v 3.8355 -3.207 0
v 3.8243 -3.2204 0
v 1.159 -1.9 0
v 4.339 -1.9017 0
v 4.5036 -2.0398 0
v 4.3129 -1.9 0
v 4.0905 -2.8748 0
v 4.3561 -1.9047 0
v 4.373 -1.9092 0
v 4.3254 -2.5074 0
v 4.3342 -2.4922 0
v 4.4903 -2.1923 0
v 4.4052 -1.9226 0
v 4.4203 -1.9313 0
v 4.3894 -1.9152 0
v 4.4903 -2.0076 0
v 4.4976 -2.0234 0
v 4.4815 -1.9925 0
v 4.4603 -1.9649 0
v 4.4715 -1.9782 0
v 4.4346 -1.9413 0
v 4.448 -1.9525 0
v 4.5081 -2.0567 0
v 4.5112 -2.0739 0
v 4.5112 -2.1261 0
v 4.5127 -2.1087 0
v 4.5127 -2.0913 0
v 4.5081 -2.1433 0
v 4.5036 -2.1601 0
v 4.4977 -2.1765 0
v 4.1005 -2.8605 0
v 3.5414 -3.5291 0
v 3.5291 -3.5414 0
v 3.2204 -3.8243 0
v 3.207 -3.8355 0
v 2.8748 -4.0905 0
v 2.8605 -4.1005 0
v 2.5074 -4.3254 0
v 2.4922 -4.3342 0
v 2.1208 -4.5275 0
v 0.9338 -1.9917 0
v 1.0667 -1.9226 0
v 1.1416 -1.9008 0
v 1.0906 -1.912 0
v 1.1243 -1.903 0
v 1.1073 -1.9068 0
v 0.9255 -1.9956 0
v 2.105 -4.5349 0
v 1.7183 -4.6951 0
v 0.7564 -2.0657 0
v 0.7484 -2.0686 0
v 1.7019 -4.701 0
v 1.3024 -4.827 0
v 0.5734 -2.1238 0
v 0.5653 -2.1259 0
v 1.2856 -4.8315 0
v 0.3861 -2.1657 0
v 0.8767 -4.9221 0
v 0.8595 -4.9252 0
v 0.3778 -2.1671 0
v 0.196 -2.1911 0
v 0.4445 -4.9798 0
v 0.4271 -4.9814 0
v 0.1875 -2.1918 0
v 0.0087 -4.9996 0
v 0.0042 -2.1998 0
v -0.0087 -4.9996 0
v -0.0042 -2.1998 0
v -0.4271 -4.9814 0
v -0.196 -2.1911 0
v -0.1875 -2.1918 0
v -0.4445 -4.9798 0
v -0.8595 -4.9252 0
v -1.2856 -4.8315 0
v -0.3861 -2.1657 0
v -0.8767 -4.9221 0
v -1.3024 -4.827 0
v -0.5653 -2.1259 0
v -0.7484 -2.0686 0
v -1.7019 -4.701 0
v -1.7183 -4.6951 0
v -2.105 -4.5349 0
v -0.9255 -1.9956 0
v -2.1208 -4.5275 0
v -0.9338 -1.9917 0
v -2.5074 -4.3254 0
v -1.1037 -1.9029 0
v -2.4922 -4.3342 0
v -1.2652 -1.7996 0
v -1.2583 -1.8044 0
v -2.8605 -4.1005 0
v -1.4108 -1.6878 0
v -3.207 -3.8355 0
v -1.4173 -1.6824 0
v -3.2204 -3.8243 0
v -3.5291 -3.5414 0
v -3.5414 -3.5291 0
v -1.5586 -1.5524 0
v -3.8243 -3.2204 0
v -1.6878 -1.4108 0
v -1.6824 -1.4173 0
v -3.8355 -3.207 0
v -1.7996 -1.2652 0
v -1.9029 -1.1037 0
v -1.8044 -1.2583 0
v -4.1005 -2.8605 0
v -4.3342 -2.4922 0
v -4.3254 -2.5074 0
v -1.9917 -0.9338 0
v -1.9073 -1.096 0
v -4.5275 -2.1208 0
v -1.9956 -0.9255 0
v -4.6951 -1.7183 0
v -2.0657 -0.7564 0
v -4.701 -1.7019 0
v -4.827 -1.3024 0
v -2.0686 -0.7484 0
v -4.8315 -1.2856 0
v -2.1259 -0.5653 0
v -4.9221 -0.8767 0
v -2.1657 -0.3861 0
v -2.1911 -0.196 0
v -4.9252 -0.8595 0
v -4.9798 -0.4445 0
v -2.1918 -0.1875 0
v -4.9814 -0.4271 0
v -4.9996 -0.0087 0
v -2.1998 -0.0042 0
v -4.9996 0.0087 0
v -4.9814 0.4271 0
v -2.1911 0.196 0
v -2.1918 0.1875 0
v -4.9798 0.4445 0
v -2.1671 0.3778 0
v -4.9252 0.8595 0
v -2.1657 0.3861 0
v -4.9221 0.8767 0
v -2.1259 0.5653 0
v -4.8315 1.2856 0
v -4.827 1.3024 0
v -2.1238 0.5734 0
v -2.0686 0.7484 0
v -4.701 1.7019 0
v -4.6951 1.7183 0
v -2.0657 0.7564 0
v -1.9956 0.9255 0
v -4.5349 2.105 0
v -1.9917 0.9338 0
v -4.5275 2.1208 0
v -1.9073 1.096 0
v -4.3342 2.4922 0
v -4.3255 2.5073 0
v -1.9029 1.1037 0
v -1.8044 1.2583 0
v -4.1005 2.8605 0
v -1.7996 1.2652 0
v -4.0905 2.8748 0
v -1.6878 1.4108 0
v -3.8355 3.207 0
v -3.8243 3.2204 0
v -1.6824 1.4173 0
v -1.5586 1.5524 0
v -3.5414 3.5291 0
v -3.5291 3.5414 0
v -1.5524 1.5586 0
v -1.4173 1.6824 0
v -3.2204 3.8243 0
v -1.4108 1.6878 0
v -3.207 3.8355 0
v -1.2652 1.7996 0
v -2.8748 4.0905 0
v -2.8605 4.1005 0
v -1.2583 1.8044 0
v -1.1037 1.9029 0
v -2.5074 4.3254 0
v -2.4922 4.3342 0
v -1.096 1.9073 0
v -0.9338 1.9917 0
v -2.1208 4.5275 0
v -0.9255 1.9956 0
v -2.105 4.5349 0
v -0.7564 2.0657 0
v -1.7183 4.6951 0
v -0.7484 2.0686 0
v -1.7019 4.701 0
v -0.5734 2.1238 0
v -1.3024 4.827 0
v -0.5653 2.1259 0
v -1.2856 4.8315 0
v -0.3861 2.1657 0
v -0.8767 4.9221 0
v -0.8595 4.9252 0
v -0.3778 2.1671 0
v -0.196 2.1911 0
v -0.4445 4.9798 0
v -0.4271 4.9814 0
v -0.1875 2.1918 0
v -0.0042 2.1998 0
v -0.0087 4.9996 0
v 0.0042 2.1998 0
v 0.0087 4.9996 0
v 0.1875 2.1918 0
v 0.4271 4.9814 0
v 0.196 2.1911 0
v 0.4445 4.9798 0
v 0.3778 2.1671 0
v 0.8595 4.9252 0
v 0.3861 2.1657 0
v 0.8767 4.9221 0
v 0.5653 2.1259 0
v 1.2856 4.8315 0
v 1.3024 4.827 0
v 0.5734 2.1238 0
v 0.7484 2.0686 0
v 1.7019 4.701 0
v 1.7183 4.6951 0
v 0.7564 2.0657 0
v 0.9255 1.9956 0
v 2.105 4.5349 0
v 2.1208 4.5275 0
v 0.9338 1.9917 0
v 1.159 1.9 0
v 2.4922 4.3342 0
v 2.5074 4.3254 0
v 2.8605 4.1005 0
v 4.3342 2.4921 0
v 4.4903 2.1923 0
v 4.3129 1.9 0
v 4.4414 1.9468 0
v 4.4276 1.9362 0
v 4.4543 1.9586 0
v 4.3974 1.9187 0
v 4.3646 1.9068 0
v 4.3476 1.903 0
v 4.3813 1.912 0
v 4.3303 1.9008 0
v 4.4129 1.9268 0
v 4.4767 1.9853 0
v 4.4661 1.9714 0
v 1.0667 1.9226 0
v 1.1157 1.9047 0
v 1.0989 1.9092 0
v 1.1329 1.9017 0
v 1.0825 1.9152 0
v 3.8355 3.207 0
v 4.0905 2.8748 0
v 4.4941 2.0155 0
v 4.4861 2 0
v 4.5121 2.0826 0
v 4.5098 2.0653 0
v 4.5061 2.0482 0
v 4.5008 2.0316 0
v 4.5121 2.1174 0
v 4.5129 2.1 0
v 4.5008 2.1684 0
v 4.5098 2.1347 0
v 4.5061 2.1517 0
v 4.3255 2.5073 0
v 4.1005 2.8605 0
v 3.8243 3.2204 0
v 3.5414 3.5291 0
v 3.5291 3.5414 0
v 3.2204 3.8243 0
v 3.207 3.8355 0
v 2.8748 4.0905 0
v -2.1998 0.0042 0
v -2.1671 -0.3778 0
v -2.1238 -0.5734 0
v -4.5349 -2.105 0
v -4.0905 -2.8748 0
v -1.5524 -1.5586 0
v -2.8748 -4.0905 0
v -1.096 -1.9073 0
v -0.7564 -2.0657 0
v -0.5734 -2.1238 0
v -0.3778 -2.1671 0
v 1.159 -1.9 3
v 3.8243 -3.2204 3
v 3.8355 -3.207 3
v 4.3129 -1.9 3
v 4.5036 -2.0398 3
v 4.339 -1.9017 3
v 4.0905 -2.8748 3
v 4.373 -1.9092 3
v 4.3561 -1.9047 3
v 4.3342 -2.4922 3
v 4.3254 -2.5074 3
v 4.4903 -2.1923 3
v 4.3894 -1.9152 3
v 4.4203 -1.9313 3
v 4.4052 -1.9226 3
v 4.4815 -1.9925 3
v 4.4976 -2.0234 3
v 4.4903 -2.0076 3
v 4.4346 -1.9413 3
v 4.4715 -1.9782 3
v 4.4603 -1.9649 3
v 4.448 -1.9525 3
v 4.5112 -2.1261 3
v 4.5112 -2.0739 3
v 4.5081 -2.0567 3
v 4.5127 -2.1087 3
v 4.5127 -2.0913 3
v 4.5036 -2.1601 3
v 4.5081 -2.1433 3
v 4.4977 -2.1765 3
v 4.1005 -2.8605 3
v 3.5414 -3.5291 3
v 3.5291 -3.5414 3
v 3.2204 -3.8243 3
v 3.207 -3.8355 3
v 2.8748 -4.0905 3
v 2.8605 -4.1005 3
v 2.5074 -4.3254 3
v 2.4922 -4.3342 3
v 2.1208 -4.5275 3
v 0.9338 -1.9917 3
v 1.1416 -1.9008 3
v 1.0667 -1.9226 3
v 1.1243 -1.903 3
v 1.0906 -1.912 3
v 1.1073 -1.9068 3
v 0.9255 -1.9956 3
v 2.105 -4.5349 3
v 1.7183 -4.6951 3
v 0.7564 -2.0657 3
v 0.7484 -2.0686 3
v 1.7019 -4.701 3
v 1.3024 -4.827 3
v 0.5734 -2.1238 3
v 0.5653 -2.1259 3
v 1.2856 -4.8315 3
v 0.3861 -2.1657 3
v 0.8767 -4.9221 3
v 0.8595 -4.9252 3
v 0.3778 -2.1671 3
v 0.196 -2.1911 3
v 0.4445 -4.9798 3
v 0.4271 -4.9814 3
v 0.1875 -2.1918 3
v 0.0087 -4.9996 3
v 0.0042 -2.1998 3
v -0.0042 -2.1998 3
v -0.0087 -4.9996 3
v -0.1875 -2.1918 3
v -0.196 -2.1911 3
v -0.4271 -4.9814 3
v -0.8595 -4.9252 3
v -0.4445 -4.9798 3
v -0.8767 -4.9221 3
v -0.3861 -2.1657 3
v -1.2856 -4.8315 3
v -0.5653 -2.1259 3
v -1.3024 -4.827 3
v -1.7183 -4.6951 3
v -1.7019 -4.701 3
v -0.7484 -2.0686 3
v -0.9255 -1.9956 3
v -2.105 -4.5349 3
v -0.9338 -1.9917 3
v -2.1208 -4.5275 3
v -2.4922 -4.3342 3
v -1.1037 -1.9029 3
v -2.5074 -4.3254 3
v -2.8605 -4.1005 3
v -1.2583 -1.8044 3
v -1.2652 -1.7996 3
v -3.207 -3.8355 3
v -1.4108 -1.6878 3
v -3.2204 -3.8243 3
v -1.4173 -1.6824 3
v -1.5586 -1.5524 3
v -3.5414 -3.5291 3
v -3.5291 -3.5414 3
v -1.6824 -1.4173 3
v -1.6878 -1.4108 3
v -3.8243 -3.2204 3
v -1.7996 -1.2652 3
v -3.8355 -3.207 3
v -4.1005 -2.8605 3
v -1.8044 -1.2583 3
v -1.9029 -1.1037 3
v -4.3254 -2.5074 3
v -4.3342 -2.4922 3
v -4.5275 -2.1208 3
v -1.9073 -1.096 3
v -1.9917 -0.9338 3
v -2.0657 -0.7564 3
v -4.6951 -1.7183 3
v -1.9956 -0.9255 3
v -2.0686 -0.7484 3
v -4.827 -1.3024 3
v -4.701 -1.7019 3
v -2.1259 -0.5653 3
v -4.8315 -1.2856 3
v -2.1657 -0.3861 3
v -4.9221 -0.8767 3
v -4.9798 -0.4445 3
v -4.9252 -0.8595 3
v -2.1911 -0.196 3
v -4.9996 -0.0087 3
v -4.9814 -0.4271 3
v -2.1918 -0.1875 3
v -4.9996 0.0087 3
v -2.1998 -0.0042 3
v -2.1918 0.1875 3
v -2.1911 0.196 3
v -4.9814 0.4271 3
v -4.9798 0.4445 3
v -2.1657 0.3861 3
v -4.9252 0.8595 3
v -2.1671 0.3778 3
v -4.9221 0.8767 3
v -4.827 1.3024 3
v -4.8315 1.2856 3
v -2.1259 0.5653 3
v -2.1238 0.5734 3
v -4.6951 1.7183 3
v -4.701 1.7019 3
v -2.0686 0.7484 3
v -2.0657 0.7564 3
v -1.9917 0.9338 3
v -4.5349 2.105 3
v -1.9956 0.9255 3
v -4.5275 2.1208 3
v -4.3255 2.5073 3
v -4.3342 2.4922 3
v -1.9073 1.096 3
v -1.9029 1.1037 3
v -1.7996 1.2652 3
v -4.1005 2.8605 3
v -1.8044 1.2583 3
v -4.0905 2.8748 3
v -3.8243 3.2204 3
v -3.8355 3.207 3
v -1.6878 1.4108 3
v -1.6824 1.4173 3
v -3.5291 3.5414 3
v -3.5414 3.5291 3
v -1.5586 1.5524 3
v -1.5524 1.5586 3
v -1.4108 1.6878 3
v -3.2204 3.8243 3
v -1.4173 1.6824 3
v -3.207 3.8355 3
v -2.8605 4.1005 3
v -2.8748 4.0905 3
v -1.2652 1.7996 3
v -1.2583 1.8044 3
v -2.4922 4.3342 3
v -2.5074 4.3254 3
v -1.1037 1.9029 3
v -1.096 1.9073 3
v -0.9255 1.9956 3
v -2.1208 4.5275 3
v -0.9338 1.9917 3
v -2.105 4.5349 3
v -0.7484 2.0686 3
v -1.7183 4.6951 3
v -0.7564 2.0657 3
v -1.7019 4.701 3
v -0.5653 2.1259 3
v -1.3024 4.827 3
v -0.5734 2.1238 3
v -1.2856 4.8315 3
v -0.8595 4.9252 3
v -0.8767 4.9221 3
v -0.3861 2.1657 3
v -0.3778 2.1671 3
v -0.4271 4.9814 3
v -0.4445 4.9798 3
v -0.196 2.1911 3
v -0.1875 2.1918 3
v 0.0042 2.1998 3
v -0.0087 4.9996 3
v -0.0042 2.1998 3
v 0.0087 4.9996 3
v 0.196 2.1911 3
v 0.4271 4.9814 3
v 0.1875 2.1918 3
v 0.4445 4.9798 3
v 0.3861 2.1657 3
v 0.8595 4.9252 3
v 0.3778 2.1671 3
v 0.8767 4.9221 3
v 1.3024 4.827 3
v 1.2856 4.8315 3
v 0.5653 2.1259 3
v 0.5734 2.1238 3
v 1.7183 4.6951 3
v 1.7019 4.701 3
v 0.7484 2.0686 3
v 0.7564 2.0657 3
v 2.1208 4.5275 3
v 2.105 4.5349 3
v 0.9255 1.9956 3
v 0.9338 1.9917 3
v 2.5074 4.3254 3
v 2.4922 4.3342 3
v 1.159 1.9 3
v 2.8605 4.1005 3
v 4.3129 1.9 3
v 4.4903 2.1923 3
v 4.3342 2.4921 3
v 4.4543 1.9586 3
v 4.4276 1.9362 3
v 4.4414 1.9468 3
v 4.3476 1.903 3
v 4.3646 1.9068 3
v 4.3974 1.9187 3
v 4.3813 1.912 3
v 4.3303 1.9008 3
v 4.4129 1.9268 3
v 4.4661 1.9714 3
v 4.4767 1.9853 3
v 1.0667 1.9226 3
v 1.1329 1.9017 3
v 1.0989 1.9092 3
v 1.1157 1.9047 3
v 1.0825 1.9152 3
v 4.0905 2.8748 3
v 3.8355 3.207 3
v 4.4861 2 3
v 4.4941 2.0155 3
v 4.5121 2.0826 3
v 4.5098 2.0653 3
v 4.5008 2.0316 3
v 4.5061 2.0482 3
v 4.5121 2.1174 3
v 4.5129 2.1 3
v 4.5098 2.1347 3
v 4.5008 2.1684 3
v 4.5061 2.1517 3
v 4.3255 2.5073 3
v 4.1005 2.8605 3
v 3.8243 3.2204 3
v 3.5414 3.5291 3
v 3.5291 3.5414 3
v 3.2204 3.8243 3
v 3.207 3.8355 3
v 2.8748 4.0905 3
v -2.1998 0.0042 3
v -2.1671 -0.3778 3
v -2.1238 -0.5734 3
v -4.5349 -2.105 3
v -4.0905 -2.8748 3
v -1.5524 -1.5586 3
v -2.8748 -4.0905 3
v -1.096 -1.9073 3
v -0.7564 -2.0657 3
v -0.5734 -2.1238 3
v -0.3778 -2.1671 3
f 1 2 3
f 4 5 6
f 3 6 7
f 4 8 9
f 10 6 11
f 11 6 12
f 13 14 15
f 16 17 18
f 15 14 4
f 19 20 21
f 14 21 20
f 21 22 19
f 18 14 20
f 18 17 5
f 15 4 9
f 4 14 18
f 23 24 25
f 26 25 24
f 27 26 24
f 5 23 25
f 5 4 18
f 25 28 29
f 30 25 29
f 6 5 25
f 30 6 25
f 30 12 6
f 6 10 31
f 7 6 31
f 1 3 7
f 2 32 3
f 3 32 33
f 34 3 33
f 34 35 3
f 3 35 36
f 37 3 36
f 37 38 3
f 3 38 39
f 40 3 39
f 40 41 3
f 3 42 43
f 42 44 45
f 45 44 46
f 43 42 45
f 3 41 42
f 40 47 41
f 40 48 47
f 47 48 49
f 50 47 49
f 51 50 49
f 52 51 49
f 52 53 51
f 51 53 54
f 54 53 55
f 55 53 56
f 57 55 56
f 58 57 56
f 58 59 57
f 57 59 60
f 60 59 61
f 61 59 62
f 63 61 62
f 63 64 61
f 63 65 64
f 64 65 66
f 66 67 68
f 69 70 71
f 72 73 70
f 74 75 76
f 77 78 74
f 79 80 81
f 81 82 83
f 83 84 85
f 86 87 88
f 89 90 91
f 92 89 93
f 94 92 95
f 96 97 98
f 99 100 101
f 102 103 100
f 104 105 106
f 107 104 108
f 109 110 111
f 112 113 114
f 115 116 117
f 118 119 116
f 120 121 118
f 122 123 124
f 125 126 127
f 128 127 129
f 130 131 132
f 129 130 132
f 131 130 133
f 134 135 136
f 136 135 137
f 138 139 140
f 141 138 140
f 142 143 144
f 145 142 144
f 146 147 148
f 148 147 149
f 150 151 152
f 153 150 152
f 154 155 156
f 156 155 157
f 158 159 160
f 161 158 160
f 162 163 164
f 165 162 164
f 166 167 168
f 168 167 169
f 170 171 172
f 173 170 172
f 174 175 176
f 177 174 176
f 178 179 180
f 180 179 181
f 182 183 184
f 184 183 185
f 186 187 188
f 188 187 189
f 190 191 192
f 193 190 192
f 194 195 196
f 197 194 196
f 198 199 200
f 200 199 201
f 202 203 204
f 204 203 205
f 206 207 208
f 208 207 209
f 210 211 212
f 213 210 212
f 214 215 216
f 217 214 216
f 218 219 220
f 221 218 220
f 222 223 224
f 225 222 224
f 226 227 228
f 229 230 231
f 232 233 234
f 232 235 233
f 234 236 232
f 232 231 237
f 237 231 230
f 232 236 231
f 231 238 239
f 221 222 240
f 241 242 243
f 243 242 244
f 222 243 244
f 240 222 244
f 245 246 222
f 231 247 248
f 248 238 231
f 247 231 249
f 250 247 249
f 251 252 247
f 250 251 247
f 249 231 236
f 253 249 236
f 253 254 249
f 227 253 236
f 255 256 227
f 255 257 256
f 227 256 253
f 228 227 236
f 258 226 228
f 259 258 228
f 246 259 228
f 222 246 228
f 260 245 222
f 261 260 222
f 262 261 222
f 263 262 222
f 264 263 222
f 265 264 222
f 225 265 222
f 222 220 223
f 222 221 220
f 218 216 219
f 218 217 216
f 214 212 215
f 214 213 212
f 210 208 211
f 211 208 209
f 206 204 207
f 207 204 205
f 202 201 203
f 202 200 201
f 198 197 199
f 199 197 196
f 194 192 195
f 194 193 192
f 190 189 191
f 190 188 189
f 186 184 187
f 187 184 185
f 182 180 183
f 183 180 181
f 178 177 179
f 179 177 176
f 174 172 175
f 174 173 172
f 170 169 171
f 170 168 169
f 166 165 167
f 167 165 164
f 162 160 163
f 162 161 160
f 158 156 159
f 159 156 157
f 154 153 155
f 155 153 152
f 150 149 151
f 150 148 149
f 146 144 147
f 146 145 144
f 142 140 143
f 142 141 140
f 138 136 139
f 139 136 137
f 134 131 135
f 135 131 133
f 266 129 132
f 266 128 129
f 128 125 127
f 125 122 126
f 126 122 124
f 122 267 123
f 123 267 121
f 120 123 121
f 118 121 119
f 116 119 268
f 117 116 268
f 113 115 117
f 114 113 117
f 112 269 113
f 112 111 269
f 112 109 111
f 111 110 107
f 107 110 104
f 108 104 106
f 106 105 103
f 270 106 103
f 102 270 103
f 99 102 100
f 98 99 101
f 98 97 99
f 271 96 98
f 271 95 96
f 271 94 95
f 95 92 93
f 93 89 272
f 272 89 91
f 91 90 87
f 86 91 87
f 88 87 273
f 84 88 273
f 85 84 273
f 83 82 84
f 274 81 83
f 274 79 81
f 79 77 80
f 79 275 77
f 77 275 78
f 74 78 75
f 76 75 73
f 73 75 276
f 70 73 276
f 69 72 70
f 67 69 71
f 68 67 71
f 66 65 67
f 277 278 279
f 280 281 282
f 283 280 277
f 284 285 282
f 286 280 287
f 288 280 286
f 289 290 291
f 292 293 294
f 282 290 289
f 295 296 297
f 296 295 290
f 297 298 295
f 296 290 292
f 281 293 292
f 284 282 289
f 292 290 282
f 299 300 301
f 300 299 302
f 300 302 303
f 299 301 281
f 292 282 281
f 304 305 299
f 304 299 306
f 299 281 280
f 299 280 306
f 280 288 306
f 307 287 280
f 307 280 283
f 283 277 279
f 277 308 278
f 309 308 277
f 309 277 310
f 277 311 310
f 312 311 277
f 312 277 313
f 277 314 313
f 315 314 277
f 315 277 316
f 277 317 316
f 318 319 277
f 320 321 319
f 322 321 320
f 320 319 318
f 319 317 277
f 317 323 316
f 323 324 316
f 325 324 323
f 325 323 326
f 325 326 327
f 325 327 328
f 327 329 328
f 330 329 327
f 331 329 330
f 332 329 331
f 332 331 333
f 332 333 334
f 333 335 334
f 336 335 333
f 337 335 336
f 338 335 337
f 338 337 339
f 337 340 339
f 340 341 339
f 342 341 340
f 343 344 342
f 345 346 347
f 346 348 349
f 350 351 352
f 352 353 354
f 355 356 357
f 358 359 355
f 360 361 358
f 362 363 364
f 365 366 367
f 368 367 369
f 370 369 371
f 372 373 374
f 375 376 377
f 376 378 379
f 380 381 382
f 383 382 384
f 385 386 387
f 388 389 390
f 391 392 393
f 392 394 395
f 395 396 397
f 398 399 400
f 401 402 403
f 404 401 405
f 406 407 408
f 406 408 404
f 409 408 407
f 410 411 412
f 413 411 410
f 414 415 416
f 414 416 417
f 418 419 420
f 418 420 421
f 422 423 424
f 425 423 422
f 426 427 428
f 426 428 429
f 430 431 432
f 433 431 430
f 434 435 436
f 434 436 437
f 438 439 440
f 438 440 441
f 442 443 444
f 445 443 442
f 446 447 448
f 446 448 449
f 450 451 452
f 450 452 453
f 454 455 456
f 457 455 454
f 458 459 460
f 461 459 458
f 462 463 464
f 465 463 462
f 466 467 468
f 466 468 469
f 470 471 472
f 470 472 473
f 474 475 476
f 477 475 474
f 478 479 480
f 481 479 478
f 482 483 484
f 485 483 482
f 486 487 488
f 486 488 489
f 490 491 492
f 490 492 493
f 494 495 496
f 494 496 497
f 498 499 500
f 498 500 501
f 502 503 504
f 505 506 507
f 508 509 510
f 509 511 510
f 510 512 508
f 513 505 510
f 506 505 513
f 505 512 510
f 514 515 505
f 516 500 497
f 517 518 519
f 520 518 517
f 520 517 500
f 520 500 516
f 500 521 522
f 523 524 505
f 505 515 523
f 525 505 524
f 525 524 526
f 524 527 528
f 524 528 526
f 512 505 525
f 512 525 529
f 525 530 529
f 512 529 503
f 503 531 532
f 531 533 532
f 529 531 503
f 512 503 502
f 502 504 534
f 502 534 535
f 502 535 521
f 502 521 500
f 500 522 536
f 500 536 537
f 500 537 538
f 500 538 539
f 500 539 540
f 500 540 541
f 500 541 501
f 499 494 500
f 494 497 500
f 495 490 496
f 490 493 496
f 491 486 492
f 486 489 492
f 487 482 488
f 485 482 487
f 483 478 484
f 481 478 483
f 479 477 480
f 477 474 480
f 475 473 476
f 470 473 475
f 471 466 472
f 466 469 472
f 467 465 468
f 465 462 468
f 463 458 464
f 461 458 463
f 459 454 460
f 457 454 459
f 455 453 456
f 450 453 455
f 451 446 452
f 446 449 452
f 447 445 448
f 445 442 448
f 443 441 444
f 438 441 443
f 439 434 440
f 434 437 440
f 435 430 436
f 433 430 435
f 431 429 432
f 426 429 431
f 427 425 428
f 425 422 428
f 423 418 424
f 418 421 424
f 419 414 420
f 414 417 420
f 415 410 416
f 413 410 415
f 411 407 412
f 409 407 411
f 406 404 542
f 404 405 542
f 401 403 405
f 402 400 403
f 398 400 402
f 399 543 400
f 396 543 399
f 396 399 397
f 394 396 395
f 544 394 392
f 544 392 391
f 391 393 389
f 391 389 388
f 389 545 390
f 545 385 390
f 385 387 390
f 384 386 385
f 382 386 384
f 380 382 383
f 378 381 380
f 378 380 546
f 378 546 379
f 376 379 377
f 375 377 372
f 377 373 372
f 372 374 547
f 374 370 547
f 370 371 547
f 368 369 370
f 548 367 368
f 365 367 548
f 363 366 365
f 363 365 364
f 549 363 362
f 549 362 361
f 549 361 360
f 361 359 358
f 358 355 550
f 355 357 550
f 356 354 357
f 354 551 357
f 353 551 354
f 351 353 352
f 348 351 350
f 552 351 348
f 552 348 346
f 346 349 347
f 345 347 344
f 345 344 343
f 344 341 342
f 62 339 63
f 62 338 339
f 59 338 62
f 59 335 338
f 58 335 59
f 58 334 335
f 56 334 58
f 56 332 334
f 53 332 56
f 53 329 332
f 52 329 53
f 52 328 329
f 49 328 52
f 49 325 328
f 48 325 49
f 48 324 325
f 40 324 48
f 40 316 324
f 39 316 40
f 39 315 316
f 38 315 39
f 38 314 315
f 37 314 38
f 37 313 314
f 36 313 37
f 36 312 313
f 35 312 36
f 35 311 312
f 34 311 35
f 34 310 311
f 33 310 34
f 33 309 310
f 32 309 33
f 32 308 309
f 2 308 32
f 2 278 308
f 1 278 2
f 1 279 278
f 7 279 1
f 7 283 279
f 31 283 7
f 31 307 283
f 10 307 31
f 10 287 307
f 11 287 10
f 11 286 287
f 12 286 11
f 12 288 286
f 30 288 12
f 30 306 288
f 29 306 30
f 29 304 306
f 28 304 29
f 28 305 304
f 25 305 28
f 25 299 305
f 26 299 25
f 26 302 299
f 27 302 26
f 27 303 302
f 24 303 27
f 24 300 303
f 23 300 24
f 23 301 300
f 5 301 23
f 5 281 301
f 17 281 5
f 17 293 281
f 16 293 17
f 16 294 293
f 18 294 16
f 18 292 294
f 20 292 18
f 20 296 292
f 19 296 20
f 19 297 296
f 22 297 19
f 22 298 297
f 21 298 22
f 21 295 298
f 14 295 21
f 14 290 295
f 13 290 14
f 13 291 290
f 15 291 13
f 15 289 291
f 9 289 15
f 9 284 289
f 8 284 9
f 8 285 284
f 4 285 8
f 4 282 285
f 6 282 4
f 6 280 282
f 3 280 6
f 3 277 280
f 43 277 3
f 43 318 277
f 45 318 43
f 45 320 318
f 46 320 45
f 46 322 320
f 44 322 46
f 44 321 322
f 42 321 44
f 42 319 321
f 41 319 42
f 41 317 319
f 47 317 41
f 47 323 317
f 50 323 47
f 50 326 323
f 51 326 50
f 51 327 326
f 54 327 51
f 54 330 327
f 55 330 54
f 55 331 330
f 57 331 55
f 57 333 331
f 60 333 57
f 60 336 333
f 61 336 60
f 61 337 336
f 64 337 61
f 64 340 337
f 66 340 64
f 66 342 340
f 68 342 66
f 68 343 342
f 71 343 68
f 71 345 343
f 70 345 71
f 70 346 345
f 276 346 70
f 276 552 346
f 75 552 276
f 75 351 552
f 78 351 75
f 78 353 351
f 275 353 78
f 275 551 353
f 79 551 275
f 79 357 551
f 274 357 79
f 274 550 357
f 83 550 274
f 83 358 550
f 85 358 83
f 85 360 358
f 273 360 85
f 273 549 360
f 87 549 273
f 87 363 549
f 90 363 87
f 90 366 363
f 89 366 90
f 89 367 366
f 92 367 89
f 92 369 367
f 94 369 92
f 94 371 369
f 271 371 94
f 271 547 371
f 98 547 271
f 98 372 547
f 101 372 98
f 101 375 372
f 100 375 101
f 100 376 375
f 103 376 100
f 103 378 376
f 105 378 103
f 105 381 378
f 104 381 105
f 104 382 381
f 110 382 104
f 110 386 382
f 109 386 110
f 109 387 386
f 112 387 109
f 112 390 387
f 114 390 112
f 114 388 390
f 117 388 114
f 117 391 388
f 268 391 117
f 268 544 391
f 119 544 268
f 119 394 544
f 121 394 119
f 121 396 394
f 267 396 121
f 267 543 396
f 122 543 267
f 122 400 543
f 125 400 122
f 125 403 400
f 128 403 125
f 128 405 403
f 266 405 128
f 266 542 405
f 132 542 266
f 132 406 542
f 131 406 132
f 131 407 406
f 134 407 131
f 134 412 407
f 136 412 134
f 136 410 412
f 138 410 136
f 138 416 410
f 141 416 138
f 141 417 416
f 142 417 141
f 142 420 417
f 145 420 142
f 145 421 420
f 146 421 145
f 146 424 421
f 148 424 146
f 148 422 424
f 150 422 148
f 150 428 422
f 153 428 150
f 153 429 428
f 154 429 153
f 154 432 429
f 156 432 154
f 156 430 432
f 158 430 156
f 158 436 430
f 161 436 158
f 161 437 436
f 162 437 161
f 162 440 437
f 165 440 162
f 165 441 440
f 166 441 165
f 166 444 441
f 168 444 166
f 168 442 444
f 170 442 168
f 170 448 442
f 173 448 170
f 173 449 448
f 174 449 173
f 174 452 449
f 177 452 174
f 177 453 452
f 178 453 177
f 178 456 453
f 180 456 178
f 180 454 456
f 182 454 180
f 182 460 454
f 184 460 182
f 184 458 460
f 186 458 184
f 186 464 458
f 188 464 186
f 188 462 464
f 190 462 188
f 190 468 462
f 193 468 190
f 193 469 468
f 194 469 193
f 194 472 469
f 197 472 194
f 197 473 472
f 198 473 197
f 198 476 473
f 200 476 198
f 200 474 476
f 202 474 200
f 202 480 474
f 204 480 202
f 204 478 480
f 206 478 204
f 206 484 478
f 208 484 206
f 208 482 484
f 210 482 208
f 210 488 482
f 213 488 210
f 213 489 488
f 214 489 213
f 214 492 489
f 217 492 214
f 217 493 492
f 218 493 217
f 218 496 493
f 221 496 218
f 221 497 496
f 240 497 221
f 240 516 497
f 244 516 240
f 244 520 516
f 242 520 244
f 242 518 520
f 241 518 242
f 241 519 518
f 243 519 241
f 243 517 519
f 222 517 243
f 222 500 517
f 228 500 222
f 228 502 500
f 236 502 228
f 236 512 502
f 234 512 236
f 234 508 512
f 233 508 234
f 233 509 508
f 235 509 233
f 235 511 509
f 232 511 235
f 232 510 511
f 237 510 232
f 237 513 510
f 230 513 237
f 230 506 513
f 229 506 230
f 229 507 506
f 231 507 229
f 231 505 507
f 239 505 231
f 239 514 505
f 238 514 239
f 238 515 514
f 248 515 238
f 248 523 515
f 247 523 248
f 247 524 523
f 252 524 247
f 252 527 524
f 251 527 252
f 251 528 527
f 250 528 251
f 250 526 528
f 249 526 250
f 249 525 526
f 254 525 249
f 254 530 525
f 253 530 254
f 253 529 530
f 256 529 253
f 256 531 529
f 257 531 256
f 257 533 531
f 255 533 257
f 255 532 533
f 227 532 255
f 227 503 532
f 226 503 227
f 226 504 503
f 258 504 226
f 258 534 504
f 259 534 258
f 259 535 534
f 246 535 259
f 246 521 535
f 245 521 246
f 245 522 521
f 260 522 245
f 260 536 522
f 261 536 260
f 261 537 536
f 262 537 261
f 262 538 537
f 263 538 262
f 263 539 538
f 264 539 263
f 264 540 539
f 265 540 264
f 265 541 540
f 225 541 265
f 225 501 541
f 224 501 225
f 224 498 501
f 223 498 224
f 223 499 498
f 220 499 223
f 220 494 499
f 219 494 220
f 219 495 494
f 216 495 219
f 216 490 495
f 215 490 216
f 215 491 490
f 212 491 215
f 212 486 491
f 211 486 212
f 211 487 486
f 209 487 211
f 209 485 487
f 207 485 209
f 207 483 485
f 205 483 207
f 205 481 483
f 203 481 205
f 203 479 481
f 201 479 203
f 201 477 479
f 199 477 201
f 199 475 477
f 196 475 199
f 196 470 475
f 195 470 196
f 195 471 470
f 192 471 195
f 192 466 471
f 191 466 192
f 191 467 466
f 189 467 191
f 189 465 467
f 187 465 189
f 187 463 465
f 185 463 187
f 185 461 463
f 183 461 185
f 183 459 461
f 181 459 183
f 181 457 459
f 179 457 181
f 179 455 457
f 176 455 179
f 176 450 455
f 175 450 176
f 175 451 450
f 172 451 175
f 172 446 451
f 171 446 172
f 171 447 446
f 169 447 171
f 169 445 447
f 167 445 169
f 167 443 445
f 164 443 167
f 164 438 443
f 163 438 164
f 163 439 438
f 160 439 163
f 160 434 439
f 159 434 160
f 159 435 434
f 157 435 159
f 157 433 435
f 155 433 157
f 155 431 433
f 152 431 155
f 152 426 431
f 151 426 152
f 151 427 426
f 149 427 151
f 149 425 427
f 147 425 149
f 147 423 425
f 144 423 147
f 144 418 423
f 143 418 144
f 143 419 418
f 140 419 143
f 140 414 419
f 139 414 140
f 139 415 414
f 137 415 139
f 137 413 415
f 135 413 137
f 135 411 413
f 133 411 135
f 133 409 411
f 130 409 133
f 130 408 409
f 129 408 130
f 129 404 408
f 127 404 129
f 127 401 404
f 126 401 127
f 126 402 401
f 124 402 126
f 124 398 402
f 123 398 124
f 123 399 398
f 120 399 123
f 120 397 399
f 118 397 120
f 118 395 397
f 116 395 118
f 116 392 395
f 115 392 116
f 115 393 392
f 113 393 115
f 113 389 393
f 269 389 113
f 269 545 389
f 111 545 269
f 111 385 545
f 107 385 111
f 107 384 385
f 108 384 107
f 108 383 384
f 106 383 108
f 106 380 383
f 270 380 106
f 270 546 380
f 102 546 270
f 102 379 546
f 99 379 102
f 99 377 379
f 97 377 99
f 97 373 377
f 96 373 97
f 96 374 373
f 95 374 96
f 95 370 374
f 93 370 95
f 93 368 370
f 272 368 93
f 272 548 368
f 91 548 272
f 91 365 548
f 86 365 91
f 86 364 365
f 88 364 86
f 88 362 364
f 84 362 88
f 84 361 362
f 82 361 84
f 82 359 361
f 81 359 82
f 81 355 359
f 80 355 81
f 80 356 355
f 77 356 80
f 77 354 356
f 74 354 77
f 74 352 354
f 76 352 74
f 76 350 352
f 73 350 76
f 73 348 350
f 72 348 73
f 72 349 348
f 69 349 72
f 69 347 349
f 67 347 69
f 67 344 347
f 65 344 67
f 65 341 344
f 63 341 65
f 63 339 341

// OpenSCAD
stem = 4.4;
r = 5;

$fn = 72;

linear_extrude(3)
offset(0.2)
offset(-0.2)
difference() {
    circle(r);

    circle(stem / 2);

    translate([r, 0])
    square([r * 2, stem - 0.6], center = true);
}
